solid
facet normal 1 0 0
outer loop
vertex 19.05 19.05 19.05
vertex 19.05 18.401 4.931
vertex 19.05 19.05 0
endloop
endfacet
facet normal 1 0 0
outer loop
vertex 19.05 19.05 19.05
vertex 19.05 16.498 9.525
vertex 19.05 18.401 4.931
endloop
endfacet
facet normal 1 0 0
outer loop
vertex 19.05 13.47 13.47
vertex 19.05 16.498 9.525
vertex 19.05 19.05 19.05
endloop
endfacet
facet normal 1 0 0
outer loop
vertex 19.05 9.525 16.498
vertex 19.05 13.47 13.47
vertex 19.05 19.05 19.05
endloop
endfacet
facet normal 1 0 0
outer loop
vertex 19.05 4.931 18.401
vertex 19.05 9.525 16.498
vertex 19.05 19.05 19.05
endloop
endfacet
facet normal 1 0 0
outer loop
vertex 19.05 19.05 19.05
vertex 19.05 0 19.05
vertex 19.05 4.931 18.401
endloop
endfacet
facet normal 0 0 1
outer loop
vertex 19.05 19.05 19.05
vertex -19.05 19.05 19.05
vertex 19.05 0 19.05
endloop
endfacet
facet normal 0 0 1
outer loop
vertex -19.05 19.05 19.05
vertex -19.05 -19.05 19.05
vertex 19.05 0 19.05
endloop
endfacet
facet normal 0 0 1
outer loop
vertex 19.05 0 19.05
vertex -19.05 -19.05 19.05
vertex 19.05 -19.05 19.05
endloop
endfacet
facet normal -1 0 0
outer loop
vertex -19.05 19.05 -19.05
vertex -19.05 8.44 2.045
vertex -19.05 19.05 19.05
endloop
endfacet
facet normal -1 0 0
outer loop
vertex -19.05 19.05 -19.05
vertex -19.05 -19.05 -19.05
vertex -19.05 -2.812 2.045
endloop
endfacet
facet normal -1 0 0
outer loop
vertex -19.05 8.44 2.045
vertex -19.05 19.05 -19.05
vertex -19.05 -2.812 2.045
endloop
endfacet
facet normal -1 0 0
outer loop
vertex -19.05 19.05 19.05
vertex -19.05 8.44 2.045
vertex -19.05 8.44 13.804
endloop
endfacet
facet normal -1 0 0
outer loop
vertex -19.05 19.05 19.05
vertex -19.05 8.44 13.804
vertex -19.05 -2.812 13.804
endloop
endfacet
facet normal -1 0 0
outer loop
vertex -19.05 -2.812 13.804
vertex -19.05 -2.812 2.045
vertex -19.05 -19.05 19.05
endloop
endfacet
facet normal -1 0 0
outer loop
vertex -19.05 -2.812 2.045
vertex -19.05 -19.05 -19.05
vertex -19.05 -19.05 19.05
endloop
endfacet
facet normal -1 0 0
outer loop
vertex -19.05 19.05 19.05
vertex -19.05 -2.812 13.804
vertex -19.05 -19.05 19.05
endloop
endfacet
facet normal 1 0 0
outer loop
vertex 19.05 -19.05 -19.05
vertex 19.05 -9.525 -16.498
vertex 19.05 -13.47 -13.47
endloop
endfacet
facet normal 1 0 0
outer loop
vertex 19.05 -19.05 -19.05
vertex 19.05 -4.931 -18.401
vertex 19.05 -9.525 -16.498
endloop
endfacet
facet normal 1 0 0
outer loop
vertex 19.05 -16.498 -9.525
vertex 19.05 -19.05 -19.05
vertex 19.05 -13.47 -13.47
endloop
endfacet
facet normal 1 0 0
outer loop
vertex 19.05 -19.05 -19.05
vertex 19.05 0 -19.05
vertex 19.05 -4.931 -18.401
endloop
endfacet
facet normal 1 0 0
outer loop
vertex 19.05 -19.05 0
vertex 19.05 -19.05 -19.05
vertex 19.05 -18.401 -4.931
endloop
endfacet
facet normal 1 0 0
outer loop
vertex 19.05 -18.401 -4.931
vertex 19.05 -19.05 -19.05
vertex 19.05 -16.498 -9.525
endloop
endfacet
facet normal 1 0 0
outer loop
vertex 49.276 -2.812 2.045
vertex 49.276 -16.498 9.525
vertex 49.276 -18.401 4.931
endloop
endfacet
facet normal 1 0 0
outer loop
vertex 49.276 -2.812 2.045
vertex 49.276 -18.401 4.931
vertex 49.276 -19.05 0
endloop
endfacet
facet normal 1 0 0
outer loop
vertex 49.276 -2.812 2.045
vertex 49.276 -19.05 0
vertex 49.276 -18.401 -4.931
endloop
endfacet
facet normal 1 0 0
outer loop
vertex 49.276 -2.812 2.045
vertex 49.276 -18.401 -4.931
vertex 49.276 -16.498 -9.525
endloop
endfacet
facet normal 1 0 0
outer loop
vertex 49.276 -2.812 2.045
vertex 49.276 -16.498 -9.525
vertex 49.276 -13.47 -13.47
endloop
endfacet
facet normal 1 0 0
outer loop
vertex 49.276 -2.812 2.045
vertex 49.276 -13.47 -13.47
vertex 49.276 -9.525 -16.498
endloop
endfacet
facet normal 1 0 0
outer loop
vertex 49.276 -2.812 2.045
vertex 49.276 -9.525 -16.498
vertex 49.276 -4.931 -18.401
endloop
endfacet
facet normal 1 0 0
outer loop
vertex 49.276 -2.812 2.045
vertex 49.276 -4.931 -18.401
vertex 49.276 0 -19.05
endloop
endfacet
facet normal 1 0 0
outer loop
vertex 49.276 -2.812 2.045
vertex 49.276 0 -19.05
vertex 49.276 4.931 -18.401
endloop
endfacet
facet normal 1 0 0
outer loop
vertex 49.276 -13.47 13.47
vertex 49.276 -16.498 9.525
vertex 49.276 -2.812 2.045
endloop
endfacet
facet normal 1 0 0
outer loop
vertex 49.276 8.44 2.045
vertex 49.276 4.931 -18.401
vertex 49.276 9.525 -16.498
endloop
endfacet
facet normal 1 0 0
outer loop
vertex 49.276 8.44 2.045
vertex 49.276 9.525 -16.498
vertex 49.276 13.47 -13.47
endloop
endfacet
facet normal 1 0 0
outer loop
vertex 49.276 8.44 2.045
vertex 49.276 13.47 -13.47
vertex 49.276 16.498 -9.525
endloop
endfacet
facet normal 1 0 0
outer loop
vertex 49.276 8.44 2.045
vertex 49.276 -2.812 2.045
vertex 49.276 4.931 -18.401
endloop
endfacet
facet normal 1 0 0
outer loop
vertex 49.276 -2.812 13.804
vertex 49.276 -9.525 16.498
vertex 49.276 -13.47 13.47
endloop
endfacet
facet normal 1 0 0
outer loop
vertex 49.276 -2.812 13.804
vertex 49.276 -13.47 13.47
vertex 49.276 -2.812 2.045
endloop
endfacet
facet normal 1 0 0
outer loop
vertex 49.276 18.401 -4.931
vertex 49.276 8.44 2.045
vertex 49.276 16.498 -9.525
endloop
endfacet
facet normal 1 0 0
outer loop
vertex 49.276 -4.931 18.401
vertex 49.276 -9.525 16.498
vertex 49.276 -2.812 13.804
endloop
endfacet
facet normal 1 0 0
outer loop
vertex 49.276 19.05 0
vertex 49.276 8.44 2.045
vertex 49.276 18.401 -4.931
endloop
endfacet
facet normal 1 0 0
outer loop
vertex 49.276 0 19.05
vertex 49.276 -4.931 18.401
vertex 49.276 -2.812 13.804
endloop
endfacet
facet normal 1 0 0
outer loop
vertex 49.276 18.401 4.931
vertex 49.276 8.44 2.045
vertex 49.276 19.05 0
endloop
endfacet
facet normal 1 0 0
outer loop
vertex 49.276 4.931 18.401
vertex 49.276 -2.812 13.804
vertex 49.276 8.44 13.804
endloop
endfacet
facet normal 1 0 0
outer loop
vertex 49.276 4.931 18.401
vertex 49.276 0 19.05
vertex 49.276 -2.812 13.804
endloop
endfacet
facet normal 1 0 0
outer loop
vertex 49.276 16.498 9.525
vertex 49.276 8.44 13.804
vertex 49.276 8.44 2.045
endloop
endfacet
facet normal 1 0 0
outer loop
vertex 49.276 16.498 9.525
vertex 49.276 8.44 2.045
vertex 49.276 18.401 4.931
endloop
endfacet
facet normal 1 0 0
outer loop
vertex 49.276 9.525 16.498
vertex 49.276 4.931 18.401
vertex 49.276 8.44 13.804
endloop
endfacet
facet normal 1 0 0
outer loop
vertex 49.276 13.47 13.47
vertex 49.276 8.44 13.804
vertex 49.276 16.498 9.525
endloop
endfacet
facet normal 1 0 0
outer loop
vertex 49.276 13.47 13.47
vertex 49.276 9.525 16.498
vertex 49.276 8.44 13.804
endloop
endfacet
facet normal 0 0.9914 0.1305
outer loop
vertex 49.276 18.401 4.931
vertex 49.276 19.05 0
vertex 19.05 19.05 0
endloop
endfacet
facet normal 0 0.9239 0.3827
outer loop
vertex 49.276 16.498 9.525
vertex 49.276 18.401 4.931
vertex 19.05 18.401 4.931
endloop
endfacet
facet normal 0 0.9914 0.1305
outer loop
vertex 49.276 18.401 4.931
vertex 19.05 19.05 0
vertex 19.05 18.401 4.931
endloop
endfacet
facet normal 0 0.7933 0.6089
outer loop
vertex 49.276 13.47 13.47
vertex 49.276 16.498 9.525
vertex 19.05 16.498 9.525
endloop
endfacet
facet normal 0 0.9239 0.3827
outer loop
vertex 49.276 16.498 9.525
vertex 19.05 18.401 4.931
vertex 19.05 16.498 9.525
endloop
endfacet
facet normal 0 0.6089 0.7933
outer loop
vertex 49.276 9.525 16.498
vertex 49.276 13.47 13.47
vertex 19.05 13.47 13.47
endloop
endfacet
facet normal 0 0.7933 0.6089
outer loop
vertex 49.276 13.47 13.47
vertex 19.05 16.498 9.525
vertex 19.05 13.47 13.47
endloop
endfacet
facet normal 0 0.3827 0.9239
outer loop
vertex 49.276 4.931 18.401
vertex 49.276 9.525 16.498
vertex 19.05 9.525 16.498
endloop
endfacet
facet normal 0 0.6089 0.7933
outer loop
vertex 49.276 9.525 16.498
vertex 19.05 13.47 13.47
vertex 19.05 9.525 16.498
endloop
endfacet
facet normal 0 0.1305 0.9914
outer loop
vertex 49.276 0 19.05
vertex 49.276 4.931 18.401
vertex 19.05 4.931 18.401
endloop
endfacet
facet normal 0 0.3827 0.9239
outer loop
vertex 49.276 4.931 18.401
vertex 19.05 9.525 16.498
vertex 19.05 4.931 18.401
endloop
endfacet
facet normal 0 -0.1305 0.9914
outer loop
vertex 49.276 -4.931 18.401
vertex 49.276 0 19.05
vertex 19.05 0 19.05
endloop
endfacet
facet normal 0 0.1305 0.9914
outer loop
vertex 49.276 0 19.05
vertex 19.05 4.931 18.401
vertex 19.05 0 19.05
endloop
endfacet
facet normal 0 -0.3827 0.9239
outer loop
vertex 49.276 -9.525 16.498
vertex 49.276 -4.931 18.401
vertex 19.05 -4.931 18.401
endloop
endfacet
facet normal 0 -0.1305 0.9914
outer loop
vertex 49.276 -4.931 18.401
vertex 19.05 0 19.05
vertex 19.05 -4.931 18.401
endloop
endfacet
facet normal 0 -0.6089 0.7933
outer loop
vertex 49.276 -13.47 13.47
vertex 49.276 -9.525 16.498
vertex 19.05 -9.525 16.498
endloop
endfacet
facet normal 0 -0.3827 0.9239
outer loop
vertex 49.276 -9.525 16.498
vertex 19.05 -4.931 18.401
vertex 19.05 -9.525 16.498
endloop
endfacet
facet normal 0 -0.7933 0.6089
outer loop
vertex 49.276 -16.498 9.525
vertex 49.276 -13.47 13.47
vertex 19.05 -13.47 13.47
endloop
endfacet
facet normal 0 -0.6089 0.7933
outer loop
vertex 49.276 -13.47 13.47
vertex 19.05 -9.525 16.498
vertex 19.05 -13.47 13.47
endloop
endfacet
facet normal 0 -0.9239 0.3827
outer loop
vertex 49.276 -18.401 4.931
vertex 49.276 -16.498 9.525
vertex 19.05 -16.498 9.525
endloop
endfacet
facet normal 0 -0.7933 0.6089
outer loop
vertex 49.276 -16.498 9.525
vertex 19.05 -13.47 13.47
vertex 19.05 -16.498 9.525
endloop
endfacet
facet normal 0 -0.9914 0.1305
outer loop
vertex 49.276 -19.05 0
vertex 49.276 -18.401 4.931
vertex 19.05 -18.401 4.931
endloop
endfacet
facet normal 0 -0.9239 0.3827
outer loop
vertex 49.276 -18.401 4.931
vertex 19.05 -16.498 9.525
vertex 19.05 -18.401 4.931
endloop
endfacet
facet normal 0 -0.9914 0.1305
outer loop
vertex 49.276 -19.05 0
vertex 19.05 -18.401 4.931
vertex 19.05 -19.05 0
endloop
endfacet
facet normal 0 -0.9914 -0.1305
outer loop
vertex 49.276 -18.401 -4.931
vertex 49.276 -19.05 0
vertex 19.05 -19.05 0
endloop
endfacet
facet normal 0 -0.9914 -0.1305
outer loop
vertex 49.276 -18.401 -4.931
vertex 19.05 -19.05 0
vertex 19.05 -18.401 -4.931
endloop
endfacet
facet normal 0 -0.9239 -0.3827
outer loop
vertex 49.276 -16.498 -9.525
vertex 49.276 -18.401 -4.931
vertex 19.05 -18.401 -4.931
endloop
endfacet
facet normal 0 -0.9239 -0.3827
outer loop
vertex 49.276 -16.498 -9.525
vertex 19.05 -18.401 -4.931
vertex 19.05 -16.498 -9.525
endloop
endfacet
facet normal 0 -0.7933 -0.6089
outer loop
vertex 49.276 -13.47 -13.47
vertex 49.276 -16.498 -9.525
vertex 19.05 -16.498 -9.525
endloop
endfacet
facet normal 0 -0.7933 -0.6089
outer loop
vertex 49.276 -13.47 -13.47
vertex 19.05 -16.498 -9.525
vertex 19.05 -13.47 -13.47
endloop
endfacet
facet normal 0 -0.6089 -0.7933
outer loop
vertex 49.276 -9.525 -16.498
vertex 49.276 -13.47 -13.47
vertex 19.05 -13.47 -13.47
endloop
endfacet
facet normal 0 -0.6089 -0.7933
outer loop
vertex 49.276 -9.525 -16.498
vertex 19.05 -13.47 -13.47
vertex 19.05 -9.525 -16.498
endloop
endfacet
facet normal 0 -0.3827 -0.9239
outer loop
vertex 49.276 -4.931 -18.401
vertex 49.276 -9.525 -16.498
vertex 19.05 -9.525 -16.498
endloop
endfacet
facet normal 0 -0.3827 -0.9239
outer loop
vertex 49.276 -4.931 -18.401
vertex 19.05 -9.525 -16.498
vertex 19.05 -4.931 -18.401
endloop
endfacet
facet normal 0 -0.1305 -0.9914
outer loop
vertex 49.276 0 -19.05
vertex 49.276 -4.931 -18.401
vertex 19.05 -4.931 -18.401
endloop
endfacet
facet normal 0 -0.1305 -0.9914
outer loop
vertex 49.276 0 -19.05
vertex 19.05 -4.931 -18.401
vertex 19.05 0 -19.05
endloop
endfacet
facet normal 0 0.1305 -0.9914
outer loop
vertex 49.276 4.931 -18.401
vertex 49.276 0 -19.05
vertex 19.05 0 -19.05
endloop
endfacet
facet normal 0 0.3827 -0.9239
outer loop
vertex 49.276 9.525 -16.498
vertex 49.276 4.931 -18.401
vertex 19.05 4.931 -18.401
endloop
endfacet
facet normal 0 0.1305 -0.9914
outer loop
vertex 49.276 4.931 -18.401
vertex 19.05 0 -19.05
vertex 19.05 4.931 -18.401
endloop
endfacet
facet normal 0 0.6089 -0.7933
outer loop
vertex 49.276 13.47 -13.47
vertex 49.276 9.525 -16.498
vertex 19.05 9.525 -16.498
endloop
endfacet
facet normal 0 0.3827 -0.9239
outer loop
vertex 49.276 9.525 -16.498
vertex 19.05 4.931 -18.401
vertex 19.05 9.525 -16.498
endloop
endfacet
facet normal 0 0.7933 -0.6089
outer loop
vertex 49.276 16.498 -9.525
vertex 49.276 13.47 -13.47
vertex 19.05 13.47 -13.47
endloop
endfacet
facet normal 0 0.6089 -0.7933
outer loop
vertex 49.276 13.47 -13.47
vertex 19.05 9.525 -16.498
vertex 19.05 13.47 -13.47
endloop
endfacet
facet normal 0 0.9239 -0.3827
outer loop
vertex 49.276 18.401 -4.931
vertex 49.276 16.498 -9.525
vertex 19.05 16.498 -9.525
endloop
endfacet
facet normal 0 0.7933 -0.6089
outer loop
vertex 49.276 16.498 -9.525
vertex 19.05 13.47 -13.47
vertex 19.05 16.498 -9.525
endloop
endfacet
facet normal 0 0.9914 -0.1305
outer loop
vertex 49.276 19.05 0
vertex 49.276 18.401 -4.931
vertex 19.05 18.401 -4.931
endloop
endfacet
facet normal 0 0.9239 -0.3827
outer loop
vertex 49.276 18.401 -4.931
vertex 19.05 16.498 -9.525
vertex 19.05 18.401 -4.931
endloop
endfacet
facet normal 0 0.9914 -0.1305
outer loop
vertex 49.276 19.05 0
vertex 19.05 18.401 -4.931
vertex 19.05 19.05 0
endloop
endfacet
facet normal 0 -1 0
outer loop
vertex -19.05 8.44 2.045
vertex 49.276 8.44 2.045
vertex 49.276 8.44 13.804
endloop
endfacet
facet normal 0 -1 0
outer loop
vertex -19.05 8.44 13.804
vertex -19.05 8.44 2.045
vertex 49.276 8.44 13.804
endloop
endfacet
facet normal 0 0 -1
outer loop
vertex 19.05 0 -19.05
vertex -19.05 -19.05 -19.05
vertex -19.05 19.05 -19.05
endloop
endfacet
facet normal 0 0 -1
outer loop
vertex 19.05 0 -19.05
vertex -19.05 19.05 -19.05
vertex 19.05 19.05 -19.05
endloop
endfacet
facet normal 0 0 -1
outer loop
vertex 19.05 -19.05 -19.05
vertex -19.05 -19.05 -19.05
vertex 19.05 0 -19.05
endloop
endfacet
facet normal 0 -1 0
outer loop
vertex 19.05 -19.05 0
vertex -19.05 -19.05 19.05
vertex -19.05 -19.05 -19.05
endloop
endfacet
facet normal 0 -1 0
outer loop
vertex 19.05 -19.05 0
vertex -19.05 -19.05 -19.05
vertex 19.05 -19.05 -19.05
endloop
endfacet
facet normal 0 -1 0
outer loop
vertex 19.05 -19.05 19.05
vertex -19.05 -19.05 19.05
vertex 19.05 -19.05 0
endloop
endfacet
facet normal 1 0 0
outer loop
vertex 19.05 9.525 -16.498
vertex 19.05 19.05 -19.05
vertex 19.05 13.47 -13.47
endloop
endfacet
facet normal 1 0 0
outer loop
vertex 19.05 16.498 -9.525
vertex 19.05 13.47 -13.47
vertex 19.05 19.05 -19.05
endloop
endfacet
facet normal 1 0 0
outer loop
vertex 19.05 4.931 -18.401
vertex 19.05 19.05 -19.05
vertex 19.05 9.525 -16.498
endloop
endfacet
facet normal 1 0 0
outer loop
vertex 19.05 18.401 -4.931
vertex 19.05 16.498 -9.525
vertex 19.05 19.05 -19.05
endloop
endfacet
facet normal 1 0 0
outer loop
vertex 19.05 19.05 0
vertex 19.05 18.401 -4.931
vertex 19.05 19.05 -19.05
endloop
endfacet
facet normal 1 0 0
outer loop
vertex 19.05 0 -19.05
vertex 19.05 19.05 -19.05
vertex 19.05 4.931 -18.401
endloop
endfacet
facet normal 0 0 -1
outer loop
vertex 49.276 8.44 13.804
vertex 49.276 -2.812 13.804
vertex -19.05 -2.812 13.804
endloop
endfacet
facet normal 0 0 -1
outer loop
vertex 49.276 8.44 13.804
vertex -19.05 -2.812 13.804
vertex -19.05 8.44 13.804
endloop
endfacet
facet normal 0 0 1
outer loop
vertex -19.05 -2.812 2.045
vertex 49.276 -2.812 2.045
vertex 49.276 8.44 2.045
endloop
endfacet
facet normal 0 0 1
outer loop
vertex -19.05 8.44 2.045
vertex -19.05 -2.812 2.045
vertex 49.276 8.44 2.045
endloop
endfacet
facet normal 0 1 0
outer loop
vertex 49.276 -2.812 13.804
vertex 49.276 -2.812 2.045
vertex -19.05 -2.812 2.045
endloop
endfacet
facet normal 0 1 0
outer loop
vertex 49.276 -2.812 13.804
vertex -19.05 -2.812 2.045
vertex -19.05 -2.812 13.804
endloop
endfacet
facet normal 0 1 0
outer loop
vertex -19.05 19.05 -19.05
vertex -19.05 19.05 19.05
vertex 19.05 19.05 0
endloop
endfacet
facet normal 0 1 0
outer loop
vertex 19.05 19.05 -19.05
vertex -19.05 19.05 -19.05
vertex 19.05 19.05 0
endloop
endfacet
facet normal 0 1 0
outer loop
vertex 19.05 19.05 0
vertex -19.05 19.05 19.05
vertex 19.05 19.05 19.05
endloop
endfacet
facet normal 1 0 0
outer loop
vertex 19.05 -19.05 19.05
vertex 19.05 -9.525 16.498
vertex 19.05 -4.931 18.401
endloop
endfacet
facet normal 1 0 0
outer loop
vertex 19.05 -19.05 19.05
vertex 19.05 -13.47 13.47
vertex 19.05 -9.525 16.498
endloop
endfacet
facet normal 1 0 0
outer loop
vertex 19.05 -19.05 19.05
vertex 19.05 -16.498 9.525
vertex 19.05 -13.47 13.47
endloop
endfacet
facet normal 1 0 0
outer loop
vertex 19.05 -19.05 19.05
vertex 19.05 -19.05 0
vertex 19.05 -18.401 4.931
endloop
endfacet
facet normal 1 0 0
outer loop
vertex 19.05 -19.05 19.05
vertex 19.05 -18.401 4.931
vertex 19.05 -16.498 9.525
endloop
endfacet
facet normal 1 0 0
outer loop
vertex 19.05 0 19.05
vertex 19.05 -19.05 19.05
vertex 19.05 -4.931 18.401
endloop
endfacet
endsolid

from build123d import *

# Parameters (mm, degrees)
F1_W     = 38.1
F1_H     = 38.1
F2_DEPTH = 19.05
F3_R     = 19.05
F4_DEPTH = 30.226
F5_W     = 11.2522
F5_H     = 11.7586595006
F6_DEPTH = 68.327


# Not quite as in the source:
# - a variable given as a bare number and used for a length is read in inches; the dataset says mm whatever the document's units were


with BuildPart() as f2:
    # F1 (on Front) → F2 (new body, symmetric)
    with BuildSketch(Plane.XZ):
        Rectangle(F1_W, F1_H)
    extrude(amount=F2_DEPTH, both=True)

    # F3 (on face) → F4 (join)
    with BuildSketch(Plane.YZ.offset(19.05)):
        Circle(F3_R)
    extrude(amount=F4_DEPTH)

    # F5 (on face) → F6 (cut, through all)
    with BuildSketch(Plane.YZ.offset(49.276)):
        with Locations((2.8142485544, 7.924313657)):
            Rectangle(F5_W, F5_H)
    extrude(amount=-F6_DEPTH, mode=Mode.SUBTRACT)


solid = f2.part
